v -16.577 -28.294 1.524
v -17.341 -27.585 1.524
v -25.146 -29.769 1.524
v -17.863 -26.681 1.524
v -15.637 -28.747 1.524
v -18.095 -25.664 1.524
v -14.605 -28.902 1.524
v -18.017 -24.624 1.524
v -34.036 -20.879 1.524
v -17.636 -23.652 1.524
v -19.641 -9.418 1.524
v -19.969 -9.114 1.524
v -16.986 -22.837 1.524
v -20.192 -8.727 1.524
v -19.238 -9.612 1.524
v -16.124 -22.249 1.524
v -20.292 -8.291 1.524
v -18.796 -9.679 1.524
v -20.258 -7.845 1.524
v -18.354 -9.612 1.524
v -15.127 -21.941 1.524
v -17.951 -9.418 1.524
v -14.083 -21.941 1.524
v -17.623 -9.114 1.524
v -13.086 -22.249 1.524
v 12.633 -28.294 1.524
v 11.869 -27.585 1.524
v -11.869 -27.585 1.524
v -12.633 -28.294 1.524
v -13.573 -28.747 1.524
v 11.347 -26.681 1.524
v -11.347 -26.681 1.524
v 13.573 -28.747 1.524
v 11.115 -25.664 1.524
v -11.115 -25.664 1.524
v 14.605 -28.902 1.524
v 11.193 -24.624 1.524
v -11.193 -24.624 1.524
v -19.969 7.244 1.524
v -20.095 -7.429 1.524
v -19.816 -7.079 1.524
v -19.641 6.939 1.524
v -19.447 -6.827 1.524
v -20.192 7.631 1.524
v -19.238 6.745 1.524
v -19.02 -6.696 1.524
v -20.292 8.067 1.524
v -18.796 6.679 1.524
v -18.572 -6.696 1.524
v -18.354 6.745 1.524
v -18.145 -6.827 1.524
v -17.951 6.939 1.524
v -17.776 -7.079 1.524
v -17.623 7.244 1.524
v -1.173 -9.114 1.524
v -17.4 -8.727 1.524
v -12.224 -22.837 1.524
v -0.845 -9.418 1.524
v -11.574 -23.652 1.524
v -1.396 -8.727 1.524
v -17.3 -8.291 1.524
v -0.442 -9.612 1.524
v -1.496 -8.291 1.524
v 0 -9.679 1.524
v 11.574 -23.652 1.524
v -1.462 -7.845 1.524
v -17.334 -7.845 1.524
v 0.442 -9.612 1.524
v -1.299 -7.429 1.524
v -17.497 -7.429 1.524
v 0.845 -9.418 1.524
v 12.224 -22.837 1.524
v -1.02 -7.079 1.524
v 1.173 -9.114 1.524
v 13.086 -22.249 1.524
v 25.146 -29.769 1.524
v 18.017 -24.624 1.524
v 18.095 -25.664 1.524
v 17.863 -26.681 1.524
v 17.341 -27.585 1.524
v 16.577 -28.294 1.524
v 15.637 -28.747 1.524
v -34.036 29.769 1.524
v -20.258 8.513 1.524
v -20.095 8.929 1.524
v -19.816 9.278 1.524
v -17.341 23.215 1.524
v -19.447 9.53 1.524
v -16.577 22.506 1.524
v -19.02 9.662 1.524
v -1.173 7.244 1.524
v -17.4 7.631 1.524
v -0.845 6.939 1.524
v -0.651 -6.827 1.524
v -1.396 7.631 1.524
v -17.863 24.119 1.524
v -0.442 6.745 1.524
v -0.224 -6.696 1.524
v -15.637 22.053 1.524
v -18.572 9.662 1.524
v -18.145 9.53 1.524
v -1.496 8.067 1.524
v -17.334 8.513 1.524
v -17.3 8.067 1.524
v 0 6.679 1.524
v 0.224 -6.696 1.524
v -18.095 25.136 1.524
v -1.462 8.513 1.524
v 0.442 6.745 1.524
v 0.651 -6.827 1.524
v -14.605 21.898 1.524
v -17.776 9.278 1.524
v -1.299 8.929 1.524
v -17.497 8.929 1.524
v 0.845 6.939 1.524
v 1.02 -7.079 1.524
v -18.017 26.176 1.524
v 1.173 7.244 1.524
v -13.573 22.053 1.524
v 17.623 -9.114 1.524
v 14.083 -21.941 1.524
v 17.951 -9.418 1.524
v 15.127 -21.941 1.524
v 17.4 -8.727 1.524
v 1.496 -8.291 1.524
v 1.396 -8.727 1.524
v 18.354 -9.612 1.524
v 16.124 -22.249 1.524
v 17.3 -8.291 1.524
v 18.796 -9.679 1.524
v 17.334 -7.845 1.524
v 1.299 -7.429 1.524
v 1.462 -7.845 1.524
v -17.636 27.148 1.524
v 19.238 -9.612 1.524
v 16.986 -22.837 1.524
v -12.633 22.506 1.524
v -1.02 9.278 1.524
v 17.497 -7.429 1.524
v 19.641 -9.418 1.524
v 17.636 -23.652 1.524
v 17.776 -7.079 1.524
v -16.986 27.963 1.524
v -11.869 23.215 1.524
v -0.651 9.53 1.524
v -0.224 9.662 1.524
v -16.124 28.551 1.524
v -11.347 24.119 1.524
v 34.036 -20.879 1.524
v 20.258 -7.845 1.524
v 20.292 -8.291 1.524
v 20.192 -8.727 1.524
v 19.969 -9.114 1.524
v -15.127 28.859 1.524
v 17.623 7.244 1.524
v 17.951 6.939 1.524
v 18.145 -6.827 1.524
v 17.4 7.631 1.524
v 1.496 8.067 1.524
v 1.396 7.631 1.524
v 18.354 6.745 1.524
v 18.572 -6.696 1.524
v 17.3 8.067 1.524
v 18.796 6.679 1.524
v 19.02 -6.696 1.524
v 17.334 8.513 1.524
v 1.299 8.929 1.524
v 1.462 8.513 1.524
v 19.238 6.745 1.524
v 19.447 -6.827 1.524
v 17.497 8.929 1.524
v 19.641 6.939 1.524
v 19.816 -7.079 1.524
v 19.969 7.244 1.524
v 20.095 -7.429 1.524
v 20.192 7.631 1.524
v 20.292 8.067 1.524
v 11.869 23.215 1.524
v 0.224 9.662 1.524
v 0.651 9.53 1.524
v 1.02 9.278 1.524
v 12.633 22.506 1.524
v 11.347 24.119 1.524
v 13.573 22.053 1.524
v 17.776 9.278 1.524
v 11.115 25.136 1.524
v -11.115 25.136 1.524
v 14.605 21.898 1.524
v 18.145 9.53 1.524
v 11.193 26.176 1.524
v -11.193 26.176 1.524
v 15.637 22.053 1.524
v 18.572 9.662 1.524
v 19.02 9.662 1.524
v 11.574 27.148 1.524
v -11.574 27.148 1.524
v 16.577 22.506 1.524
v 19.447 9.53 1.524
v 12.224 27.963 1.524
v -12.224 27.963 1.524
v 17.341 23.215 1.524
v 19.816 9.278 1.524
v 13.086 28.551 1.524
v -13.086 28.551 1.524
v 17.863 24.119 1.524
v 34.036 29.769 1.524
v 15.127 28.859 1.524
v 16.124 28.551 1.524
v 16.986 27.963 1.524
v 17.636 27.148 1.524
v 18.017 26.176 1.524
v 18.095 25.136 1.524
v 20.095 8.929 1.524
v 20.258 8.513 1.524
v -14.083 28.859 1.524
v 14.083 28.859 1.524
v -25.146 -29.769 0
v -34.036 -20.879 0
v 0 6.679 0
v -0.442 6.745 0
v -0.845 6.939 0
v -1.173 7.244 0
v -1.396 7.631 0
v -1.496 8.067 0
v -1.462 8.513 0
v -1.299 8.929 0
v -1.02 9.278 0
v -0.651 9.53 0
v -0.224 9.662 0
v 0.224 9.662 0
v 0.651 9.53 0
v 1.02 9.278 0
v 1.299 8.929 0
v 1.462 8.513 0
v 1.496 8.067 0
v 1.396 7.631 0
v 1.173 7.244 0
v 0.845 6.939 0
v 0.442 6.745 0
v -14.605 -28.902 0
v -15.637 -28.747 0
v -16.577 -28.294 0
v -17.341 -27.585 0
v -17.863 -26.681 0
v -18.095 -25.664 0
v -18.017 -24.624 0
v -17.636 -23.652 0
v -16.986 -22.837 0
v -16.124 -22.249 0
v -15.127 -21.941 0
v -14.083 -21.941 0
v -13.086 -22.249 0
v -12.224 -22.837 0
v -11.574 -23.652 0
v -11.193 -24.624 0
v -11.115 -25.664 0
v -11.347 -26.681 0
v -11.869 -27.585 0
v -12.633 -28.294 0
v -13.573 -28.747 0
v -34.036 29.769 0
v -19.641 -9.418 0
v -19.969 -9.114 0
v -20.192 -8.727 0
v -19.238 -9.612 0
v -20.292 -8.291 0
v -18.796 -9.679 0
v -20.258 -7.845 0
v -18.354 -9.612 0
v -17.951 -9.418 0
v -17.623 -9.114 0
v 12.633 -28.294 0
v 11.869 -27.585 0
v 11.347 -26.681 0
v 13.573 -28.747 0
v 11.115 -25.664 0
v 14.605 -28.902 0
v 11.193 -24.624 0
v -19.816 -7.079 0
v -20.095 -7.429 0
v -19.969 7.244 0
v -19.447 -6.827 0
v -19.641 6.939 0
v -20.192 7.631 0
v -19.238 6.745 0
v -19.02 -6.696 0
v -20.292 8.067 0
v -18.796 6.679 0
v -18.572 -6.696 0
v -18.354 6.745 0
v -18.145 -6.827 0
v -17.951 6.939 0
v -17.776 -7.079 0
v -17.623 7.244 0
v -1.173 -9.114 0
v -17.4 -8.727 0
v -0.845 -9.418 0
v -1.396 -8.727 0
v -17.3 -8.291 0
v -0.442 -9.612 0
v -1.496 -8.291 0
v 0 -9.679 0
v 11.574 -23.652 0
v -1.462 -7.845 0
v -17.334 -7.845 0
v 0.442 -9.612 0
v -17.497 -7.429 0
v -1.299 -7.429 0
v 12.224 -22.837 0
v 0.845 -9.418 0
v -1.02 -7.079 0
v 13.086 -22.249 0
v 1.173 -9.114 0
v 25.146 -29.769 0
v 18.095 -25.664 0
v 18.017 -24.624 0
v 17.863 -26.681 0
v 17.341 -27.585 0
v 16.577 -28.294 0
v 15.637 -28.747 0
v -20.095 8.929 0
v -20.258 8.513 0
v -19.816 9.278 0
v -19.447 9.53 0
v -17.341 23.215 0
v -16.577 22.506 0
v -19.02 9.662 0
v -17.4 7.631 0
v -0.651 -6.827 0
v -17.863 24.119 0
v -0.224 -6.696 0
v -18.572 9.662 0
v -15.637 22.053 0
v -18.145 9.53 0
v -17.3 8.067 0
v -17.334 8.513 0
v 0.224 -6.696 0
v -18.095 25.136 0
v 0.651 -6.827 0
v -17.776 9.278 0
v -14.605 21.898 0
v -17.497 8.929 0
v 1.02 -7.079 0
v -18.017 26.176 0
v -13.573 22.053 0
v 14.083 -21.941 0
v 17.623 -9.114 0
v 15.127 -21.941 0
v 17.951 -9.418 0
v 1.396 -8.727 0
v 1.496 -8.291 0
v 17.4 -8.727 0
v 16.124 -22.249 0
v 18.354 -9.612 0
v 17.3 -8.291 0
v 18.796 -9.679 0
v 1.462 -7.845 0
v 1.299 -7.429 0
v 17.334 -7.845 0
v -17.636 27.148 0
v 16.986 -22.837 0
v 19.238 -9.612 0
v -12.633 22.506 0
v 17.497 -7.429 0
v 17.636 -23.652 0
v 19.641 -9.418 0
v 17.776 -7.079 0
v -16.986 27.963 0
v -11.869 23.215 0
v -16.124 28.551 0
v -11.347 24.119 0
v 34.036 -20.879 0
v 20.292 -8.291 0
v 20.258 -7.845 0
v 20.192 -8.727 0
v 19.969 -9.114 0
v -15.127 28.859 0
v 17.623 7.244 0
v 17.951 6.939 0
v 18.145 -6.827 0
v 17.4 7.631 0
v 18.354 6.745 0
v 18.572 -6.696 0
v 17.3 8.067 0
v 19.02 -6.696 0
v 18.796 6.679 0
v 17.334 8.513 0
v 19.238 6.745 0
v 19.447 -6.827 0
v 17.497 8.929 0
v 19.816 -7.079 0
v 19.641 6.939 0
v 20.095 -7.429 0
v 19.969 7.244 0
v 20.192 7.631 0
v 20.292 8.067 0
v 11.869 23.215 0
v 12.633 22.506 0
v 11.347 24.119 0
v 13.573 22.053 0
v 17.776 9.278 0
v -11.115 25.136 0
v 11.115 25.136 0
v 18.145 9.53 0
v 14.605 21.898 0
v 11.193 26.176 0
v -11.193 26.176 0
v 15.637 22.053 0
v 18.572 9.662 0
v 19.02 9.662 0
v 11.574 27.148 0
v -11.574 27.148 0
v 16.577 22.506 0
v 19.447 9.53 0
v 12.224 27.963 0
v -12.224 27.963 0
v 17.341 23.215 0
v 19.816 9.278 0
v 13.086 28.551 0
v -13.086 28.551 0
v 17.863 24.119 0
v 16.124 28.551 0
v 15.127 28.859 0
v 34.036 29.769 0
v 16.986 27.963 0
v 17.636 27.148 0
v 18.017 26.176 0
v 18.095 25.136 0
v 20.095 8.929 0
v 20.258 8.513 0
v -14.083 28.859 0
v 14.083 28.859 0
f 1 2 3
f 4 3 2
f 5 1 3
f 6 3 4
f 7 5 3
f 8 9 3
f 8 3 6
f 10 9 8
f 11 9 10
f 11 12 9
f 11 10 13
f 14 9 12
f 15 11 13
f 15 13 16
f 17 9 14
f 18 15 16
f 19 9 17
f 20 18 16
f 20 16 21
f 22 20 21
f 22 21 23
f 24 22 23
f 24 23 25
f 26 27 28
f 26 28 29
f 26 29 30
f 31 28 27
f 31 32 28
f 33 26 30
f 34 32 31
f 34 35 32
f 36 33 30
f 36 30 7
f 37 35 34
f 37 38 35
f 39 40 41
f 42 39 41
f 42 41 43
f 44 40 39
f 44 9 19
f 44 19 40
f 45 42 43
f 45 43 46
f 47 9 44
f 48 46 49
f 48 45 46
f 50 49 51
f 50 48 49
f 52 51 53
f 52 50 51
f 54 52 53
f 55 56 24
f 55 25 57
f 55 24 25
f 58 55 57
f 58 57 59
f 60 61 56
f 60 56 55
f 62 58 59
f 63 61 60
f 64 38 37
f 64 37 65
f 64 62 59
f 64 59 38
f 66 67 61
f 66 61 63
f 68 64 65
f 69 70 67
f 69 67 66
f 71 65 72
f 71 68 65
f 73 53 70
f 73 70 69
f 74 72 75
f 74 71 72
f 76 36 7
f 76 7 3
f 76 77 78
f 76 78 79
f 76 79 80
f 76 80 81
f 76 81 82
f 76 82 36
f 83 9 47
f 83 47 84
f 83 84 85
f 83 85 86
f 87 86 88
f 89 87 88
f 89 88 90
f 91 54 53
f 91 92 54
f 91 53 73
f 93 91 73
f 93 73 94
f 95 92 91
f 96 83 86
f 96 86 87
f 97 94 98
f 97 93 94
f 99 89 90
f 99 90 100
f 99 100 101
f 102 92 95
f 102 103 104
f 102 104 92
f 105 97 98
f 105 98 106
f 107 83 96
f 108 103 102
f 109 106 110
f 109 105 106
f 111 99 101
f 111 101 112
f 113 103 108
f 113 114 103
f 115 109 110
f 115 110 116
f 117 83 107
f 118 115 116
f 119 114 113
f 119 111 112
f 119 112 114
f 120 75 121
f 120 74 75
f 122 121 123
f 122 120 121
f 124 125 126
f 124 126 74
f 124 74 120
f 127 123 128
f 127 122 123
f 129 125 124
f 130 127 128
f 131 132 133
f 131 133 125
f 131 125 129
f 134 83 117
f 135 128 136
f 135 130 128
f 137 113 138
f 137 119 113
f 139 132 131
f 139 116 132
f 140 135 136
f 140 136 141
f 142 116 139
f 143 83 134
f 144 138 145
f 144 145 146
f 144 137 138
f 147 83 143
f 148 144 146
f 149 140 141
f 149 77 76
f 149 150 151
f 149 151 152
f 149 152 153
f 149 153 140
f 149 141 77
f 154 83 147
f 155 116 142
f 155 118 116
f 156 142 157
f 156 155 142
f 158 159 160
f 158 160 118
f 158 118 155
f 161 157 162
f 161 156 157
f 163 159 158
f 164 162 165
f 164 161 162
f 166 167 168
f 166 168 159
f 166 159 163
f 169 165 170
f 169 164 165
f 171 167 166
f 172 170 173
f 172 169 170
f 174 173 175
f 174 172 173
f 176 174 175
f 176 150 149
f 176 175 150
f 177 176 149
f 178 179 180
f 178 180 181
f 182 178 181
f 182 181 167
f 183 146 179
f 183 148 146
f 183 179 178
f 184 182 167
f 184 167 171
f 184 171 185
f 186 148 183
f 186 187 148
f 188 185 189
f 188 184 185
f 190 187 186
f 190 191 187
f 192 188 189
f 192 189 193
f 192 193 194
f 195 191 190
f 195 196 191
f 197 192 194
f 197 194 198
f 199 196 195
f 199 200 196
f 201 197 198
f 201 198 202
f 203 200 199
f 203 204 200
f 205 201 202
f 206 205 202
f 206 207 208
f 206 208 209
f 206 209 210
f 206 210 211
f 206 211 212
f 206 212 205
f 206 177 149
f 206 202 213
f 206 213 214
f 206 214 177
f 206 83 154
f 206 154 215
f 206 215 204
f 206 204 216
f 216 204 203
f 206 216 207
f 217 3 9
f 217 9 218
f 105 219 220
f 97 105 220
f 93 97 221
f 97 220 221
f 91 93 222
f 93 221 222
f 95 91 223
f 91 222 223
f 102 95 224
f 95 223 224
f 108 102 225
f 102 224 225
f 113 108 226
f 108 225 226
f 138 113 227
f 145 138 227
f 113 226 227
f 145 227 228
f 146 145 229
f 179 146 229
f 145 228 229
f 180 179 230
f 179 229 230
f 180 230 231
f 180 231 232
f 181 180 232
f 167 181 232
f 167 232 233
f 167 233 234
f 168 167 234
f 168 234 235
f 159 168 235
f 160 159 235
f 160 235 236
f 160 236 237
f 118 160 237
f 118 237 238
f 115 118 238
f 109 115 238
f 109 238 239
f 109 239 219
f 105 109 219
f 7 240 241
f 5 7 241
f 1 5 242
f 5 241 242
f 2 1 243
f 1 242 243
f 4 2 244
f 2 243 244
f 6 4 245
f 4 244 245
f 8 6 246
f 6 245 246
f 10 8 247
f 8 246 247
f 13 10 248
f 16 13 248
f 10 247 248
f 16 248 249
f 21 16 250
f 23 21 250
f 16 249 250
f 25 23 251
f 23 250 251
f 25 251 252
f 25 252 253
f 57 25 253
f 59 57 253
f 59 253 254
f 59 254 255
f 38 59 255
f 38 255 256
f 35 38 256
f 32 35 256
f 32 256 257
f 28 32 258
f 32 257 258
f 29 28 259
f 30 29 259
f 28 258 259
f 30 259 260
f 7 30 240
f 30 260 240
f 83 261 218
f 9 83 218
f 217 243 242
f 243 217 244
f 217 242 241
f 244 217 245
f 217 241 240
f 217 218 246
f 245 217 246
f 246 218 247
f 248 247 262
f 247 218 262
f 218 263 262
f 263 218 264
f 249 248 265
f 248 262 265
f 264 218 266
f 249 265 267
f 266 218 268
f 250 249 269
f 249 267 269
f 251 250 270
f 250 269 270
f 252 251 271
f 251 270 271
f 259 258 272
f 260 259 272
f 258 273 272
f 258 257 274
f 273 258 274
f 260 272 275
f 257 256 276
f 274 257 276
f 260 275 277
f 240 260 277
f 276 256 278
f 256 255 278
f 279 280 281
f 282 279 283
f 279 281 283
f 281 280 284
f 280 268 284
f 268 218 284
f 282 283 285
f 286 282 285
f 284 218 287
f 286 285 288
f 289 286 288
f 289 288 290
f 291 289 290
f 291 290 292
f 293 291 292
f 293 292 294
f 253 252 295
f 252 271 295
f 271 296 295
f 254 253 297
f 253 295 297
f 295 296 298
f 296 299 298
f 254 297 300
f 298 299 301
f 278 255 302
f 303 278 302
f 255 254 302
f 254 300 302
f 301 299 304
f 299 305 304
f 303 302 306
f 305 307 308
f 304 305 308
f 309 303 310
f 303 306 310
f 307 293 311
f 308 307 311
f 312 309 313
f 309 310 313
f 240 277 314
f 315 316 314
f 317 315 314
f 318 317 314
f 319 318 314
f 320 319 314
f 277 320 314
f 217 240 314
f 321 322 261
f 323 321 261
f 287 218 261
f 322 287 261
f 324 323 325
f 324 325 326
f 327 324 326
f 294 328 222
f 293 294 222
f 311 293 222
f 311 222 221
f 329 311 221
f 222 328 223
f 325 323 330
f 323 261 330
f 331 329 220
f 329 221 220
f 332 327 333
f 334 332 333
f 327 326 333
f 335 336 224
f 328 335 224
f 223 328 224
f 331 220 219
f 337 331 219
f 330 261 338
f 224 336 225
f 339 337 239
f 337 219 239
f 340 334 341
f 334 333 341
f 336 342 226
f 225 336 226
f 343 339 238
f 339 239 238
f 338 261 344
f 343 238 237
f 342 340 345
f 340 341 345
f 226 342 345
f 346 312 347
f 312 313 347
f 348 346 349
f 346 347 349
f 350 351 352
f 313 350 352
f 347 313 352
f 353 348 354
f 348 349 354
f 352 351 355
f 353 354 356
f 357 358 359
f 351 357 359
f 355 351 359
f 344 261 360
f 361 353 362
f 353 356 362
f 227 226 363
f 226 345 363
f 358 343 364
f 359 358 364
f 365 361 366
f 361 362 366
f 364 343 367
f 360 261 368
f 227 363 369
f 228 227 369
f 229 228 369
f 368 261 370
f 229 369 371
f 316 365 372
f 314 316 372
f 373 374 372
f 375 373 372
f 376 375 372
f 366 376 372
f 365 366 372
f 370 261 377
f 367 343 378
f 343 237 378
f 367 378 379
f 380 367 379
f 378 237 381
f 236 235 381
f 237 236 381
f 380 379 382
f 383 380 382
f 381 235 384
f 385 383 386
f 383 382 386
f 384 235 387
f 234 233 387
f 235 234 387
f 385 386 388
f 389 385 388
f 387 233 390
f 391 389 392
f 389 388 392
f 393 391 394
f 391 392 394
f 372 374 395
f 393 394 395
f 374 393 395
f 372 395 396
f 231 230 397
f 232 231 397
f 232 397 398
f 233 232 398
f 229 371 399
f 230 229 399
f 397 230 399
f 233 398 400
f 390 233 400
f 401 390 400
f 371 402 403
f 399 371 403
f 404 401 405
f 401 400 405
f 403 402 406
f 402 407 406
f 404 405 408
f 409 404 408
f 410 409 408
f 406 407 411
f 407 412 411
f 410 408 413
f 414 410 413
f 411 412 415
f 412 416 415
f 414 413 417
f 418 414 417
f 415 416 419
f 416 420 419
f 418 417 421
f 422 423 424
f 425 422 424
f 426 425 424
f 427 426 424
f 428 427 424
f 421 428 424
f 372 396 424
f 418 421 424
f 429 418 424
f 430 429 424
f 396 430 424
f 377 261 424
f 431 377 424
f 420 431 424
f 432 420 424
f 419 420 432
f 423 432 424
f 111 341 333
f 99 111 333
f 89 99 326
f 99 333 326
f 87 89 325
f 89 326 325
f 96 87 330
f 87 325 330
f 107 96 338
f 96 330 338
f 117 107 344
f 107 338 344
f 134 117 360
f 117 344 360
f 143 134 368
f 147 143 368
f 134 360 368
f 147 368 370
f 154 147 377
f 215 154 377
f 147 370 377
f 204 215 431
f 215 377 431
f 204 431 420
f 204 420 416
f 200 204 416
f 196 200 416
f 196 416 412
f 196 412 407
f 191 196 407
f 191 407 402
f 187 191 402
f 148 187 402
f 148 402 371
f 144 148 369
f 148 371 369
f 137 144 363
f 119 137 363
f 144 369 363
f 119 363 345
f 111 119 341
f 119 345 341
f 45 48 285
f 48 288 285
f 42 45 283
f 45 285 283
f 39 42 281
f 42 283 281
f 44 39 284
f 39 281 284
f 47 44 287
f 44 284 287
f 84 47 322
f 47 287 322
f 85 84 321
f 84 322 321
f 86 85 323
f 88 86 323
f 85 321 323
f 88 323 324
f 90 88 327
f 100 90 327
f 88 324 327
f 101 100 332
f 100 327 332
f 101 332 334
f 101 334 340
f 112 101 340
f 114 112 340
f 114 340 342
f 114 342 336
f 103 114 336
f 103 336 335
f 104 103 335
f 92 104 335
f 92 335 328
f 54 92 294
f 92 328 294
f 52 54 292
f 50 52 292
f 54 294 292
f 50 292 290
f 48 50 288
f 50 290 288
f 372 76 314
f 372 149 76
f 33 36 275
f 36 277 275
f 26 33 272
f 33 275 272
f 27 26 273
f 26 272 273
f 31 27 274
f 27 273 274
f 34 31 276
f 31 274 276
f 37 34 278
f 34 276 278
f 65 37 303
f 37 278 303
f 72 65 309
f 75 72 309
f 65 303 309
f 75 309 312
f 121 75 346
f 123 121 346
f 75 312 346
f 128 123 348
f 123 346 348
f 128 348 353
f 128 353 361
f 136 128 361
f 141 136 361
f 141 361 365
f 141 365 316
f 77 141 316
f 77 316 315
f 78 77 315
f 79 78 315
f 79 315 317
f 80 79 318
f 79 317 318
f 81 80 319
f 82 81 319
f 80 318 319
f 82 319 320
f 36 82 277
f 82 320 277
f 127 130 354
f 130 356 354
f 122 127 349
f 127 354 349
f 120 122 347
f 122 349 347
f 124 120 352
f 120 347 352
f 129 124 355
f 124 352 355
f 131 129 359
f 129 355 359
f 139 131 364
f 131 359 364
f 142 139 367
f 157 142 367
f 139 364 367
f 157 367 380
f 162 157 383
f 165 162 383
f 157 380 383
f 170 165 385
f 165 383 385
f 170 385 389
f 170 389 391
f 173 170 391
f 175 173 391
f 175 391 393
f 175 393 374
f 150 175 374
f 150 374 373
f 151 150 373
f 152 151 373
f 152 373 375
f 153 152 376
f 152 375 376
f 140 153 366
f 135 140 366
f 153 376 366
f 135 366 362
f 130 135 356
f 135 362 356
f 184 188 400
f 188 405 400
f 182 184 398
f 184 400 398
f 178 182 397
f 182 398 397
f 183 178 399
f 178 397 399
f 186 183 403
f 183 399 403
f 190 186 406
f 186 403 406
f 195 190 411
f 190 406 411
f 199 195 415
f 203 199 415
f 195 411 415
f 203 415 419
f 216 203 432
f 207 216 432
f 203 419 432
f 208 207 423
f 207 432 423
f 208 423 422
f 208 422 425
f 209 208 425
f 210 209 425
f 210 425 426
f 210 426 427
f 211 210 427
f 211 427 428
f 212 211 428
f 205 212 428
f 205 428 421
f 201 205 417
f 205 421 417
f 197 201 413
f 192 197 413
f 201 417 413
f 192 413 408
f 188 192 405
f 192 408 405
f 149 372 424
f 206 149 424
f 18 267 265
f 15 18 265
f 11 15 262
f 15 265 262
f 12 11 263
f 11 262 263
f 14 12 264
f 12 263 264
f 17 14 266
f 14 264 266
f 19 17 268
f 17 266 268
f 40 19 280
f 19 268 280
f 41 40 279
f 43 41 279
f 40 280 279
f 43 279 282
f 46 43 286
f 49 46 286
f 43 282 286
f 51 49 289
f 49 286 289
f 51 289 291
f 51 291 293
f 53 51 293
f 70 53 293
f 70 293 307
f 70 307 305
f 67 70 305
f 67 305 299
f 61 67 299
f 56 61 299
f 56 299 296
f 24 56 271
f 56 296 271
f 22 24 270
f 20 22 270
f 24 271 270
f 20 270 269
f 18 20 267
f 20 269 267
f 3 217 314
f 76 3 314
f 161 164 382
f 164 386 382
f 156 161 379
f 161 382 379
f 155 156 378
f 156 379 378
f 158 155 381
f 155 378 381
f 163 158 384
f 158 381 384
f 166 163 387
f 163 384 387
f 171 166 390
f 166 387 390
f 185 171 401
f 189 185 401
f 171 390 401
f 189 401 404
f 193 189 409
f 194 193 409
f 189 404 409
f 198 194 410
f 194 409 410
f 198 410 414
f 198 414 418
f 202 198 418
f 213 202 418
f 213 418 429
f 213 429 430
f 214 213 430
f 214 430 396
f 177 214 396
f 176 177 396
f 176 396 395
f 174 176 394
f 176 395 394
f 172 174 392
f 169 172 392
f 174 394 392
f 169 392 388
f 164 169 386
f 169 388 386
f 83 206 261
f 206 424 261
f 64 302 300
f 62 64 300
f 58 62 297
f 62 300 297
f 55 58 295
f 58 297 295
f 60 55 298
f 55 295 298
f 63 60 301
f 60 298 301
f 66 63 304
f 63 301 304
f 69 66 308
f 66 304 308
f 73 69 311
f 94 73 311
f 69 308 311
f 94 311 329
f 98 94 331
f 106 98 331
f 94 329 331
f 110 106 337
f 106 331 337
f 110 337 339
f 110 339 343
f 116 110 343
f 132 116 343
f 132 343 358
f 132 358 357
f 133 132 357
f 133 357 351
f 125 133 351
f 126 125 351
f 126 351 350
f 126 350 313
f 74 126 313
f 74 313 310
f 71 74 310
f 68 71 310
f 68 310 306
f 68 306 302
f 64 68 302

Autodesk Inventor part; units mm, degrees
ref_plane "YZ Plane" through (0, 0, 0) normal (1, 0, 0) x (0, 1, 0)
ref_plane "XZ Plane" through (0, 0, 0) normal (0, 1, 0) x (-1, 0, 0)
ref_plane "XY Plane" through (0, 0, 0) normal (0, 0, 1) x (1, 0, 0)
sketch "Sketch1" plane through (0, 0, 0) normal (0, 0, 1) x (1, 0, 0)
  line L0 (-34.036, -29.7688) -> (34.036, -29.7688)
  line L1 (34.036, -29.7688) -> (34.036, 29.7688)
  line L2 (34.036, 29.7688) -> (-34.036, 29.7688)
  line L3 (-34.036, 29.7688) -> (-34.036, -29.7688)
  line L4 (-34.036, -29.7688) -> (34.036, 29.7688) construction
  line L5 (34.036, -29.7688) -> (-34.036, 29.7688) construction
  point P0 (0, 0)
  dimension "d0" = 68.072
  dimension "d1" = 59.5376
extrude "Extrusion1" add sketch "Sketch1" along normal blind 1.524
sketch "Sketch2" plane through (0, 0, 1.524) normal (0, 0, 1) x (1, 0, 0)
  line L0 (34.036, 29.7688) -> (-34.036, 29.7688) projected
  line L1 (-34.036, -29.7688) -> (34.036, -29.7688) projected
  line L2 (-34.036, 29.7688) -> (-34.036, -29.7688) projected
  line L3 (34.036, -29.7688) -> (34.036, 29.7688) projected
  point P0 (0, 0)
  point P1 (-18.796, 8.1788)
  point P2 (-18.796, -8.1788)
  point P3 (0, 8.1788)
  point P4 (0, -8.1788)
  point P5 (18.796, 8.1788)
  point P6 (18.796, -8.1788)
  dimension "d4" = 21.59
  dimension "d5" = 21.59
  dimension "d6" = 15.24
  dimension "d7" = 15.24
  dimension "d8" = 37.592
  dimension "d9" = 18.796
hole "Hole1" at (-18.796, 8.1788, 1.524) at (-18.796, -8.1788, 1.524) at (0, 8.1788, 1.524) at (0, -8.1788, 1.524) at (18.796, 8.1788, 1.524) at (18.796, -8.1788, 1.524) direction (0, 0, -1) diameter 3 depth 25.4 tip angle 118
chamfer "Chamfer1" distance 8.89 angle 45 2 edges at (-34.036, -29.7688, 0.762) (34.036, -29.7688, 0.762)
sketch "Sketch4" plane through (0, 0, 1.524) normal (0, 0, 1) x (1, 0, 0)
  circle A0 centre (-14.605, 25.3976) radius 3.1496
  circle A1 centre (14.605, 25.3976) radius 3.1496
  circle A2 centre (-14.605, -25.4024) radius 3.1496
  circle A3 centre (14.605, -25.4024) radius 3.1496
  point P0 (0, 0)
hole "Hole3" at (-14.605, 25.3976, 1.524) at (14.605, 25.3976, 1.524) at (14.605, -25.4024, 1.524) at (-14.605, -25.4024, 1.524) direction (0, 0, -1) diameter 7 end through all
equation "\"d5\" = d4"
equation "\"d7\" = d6"
equation "\"d9\" = 0.5 * d8"
properties part number "DPLX_P030_VIPE Insulation Bottom" material "Polyethylene, High Density"
